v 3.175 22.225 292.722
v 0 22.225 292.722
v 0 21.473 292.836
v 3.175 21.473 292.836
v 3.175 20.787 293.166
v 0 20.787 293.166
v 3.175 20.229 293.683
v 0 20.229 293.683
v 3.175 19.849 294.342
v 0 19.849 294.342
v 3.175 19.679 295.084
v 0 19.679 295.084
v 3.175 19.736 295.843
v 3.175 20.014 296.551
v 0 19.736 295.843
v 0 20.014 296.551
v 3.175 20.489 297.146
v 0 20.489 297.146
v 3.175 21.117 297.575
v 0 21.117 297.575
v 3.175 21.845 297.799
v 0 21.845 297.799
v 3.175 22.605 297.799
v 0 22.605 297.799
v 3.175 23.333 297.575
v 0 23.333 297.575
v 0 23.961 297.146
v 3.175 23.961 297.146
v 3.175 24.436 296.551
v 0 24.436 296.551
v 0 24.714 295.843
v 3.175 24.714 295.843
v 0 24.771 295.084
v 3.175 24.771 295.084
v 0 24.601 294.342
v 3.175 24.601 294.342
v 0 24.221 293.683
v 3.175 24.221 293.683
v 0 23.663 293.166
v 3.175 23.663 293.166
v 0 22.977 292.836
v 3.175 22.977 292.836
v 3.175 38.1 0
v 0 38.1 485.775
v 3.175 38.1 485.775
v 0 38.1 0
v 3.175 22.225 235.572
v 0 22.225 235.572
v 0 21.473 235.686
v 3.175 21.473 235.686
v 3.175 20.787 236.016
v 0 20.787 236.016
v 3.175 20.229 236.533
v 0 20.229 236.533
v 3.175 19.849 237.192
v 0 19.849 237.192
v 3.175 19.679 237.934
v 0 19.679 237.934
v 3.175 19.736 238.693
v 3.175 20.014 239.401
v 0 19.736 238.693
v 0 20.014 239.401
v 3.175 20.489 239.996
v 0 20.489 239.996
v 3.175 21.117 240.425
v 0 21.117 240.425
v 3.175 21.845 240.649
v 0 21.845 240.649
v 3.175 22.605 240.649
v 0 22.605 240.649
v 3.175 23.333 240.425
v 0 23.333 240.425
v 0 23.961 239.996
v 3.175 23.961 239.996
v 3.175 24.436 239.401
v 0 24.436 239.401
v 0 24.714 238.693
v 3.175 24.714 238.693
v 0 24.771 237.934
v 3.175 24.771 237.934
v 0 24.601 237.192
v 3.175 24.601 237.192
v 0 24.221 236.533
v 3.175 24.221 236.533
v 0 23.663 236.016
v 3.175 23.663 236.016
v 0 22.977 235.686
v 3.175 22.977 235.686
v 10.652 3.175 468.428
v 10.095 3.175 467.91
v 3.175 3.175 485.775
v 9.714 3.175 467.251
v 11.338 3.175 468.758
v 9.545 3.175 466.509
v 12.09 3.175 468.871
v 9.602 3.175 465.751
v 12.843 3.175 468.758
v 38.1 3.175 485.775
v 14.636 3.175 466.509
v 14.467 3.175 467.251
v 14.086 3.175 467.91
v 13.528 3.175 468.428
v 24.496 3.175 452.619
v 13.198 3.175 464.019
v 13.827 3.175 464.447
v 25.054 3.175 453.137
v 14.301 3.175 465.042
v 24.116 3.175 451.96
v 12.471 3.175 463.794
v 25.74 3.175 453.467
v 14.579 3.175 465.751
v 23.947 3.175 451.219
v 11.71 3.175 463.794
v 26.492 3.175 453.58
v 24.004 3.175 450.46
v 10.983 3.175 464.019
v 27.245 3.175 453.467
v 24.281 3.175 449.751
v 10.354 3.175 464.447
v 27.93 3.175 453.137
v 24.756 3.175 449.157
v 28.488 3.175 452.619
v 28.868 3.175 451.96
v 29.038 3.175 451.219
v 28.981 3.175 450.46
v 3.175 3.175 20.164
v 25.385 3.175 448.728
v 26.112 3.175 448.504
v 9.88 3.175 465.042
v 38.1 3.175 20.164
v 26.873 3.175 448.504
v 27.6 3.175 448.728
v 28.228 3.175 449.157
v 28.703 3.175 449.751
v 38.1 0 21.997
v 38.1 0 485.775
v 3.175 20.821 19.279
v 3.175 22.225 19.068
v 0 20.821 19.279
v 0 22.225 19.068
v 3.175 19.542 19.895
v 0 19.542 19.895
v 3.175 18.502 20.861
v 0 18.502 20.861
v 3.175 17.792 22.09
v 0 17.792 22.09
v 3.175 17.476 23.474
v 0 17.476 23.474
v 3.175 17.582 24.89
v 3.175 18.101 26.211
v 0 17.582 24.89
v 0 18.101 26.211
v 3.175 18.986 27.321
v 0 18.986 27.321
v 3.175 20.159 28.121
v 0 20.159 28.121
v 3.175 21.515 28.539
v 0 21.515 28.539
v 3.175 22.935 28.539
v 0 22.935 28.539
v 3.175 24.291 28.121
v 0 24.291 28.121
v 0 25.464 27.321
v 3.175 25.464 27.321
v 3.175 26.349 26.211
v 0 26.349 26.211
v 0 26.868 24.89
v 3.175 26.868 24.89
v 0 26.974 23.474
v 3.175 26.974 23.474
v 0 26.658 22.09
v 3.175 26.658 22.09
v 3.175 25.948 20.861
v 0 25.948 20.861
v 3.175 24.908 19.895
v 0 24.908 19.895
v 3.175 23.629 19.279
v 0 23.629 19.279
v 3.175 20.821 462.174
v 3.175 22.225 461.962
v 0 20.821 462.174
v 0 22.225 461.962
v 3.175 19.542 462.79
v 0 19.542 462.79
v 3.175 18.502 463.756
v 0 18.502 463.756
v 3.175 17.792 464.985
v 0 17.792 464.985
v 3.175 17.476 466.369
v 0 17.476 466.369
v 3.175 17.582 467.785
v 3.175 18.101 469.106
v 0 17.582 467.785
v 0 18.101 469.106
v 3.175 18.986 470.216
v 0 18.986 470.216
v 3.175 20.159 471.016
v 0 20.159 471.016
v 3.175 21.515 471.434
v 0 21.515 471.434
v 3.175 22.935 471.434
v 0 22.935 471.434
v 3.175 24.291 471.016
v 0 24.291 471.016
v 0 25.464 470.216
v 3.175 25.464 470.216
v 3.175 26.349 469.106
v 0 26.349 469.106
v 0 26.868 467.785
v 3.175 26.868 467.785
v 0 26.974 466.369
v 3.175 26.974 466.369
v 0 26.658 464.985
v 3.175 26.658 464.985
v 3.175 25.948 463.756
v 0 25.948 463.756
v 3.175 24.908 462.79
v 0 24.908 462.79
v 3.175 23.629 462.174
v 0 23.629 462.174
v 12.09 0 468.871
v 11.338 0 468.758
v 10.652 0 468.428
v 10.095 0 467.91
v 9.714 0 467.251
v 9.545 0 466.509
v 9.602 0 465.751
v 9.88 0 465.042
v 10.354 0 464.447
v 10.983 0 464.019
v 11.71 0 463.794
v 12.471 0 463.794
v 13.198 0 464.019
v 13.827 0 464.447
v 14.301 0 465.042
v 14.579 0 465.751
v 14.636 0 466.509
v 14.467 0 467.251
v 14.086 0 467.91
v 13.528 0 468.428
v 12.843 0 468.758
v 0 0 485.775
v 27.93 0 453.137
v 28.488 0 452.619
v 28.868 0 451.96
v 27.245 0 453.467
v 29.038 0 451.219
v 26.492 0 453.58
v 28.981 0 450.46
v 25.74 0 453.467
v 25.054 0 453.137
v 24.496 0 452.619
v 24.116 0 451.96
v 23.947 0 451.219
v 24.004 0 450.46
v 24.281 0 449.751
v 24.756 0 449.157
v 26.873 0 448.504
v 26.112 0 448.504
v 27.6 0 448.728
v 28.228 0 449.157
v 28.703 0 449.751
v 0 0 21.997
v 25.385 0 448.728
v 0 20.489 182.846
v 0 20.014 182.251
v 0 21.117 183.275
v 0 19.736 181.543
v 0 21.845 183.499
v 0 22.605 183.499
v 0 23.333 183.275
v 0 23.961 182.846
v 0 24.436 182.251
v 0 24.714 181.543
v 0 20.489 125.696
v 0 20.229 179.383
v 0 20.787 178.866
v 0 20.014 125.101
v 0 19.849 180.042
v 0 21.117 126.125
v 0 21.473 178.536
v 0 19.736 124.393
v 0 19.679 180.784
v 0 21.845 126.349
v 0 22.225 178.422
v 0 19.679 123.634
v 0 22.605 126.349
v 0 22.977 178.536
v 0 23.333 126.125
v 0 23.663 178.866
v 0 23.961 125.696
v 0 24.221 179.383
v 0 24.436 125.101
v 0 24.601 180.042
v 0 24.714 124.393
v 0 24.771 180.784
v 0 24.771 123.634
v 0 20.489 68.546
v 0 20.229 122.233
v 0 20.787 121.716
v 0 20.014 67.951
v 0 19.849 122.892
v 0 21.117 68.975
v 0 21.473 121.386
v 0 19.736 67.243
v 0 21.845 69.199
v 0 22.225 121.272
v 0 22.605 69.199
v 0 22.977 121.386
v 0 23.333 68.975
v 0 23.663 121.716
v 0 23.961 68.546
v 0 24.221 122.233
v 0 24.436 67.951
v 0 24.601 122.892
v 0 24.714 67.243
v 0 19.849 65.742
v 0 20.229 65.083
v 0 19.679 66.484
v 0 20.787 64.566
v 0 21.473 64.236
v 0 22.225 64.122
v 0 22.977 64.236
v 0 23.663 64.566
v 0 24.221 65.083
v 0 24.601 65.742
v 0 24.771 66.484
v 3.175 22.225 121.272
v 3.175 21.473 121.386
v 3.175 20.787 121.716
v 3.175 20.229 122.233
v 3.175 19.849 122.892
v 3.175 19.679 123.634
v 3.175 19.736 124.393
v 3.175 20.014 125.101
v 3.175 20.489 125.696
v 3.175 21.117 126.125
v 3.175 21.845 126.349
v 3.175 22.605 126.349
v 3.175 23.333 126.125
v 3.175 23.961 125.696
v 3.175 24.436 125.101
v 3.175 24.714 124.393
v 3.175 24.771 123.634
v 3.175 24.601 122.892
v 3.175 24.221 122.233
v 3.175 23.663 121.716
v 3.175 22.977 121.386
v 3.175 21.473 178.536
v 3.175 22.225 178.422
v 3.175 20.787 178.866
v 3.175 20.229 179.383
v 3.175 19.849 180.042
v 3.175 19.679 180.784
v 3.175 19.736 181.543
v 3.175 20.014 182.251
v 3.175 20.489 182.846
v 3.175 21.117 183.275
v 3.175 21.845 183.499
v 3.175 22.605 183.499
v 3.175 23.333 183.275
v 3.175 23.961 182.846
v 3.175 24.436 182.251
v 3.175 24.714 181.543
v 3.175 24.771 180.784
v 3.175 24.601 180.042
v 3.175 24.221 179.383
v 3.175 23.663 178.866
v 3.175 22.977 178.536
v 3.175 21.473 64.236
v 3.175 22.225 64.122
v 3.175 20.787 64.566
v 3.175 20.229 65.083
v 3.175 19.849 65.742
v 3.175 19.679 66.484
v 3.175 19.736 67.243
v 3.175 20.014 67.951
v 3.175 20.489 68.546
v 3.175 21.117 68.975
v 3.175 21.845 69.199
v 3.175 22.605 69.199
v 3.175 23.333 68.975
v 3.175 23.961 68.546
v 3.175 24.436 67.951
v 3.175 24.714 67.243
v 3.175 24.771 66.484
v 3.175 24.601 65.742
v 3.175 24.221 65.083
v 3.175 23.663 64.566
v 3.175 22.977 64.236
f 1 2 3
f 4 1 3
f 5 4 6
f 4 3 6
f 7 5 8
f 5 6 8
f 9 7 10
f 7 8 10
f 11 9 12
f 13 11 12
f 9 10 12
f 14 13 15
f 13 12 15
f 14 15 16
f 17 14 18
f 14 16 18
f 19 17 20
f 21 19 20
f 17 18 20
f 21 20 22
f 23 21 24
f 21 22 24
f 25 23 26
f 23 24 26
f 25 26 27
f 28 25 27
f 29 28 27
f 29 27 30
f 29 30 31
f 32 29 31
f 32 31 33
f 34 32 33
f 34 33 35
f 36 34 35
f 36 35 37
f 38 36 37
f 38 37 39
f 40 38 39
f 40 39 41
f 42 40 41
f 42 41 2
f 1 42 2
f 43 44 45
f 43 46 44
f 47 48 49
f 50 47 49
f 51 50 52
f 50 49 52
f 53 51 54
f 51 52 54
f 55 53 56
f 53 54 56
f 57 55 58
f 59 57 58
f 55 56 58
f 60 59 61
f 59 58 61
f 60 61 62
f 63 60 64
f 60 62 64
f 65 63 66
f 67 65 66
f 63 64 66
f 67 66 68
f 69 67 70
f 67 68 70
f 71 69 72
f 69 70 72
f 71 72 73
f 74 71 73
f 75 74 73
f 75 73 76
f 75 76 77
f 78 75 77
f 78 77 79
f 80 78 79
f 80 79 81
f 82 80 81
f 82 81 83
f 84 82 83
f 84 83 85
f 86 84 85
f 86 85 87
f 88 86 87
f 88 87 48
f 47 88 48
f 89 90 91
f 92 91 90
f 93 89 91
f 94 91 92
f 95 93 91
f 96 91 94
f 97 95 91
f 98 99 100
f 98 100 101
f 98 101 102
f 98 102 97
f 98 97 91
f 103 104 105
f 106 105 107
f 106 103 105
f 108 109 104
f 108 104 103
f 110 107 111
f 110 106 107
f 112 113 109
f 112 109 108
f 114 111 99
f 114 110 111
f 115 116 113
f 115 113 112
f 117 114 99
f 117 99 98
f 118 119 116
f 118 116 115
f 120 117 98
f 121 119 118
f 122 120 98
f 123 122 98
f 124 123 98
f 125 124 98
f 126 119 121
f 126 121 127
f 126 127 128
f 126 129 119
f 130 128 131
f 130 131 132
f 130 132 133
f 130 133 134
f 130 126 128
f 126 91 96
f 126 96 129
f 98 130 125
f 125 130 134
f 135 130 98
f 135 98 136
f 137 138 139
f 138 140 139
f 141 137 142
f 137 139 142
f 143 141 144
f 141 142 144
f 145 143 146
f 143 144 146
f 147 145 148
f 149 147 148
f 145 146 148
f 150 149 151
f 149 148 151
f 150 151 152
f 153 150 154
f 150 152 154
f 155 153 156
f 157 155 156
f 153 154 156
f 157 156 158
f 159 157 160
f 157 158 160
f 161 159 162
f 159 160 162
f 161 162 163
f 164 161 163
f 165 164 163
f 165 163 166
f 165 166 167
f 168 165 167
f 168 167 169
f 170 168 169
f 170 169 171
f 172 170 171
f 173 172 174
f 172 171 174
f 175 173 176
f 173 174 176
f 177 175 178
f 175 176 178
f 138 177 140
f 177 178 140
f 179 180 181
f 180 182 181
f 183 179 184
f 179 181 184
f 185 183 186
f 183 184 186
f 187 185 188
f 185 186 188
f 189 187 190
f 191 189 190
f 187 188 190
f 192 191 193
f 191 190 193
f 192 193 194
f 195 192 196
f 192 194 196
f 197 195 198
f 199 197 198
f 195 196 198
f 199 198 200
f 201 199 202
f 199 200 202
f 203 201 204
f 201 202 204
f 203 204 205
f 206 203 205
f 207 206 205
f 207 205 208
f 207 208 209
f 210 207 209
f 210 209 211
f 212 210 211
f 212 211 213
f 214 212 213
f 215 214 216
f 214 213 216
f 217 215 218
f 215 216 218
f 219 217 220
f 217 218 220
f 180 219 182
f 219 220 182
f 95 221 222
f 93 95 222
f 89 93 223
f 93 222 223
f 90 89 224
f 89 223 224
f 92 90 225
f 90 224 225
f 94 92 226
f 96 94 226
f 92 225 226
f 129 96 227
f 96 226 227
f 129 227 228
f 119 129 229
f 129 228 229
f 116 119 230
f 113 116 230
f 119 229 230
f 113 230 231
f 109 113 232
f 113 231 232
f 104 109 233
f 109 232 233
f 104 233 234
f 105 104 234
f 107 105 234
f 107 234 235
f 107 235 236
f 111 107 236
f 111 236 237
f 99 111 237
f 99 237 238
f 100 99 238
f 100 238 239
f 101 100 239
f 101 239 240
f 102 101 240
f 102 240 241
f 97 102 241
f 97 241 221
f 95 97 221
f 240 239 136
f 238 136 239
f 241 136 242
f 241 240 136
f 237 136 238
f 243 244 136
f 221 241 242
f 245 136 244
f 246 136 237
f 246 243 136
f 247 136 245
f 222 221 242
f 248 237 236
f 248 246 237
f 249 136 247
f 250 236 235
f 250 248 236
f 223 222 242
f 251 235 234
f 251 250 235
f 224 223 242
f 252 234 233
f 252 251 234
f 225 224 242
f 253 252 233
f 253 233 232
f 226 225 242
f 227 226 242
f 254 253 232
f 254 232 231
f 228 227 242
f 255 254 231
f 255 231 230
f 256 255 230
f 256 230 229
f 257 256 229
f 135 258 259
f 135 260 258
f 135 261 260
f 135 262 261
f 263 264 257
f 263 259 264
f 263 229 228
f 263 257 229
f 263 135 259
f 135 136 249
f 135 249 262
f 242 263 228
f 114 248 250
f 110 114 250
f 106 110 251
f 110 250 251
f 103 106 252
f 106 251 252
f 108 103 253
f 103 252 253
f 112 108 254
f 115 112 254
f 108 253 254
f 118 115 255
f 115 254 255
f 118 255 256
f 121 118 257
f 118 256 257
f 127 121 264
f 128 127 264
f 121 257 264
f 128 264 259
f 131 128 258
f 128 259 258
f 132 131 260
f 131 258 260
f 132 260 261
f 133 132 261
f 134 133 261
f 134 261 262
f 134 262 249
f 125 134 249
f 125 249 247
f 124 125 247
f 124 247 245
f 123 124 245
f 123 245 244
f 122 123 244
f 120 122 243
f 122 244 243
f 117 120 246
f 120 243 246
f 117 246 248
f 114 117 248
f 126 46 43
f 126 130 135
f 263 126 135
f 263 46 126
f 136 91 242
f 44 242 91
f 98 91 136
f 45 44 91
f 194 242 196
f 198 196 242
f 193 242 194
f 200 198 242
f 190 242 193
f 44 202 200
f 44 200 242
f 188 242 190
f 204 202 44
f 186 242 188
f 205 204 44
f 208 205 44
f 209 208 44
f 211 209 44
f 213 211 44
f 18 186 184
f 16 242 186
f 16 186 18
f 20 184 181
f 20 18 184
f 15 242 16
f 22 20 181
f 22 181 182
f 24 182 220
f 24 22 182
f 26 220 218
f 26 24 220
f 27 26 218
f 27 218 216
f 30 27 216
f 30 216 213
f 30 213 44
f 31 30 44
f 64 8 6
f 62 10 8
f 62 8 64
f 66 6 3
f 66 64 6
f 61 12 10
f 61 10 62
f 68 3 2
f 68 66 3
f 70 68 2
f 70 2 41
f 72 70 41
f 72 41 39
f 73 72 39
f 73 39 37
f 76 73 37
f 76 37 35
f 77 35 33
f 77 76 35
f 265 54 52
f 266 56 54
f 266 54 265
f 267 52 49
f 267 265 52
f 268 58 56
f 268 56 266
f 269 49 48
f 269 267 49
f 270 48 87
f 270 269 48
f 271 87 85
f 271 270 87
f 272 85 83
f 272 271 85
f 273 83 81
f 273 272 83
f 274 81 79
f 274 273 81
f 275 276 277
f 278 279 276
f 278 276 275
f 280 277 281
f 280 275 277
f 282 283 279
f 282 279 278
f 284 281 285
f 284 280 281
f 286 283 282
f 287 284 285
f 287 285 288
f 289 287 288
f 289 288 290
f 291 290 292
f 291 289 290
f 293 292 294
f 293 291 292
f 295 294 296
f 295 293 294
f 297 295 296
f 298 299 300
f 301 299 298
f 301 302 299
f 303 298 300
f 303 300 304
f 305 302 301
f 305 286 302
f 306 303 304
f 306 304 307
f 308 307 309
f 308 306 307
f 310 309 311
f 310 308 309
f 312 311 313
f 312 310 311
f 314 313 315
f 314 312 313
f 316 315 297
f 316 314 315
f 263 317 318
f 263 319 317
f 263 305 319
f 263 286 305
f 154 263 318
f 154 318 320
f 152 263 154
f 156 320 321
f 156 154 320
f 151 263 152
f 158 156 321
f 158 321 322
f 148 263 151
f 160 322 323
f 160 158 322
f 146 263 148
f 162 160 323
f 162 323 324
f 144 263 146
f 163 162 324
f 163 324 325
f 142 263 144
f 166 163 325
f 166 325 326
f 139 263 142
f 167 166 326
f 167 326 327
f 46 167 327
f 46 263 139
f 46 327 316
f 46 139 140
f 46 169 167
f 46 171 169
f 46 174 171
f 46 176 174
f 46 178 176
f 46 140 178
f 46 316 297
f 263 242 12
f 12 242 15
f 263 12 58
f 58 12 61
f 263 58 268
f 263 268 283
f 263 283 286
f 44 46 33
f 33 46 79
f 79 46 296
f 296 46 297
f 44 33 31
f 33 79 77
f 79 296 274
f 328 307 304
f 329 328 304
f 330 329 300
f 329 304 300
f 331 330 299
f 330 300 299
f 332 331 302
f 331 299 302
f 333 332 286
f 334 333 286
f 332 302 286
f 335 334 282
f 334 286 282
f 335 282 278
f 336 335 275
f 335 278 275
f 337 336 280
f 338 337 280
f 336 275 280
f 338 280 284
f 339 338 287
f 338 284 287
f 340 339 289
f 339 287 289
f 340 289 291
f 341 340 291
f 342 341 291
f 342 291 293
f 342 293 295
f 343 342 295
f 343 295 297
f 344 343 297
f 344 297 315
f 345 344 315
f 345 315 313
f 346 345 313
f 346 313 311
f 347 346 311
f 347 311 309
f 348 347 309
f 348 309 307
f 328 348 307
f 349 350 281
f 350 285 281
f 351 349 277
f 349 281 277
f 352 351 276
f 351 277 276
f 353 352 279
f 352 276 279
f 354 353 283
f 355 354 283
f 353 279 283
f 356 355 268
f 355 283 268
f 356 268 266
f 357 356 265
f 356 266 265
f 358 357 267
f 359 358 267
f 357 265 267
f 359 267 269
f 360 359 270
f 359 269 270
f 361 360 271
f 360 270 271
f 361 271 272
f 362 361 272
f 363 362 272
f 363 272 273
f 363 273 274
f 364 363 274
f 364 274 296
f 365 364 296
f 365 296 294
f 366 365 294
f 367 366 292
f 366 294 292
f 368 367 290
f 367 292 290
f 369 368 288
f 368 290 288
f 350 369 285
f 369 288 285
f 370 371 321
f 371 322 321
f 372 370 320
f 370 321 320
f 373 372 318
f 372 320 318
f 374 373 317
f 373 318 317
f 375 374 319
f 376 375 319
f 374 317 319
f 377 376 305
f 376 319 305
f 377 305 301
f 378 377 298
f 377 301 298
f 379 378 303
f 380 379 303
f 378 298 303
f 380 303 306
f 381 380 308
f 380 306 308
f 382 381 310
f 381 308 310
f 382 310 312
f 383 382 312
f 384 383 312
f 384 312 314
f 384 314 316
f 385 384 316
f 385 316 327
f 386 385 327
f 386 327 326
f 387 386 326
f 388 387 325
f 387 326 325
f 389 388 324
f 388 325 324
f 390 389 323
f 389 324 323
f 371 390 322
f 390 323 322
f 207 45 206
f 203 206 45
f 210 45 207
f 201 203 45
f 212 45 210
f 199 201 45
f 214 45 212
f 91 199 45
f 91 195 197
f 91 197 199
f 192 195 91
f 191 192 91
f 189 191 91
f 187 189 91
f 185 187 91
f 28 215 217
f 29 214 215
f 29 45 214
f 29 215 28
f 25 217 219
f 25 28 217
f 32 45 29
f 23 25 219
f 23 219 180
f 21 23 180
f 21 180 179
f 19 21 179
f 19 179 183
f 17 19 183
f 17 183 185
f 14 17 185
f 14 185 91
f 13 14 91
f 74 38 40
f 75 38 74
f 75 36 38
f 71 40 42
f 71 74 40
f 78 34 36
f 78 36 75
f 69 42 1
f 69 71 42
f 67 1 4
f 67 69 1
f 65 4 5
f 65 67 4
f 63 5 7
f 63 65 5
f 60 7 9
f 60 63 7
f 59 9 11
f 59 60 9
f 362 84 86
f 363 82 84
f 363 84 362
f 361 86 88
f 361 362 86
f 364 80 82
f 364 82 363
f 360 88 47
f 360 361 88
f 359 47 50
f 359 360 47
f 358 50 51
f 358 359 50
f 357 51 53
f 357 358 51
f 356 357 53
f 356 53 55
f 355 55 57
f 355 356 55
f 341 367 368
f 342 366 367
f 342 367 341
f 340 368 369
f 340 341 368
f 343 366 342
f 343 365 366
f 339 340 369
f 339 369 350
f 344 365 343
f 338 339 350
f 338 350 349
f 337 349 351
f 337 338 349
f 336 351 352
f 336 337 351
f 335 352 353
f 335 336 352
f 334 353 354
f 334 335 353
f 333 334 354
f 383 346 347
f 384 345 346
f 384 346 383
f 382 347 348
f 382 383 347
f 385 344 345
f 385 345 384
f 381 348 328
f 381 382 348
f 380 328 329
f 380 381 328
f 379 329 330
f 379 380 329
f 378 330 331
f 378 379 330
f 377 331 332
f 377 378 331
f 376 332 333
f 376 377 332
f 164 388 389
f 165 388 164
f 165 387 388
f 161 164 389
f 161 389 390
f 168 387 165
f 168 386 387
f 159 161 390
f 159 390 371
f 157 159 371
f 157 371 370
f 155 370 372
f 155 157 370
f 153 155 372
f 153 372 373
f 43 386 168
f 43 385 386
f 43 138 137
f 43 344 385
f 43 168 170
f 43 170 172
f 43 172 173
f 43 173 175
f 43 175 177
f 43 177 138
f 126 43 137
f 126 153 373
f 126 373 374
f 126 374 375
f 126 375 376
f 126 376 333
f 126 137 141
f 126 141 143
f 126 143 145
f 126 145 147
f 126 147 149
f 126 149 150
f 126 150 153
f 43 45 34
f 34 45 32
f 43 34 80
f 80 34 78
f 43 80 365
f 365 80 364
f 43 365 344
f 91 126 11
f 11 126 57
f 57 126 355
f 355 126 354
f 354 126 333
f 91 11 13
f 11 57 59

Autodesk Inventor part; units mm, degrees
ref_plane "YZ Plane" through (0, 0, 0) normal (1, 0, 0) x (0, 1, 0)
ref_plane "XZ Plane" through (0, 0, 0) normal (0, 1, 0) x (-1, 0, 0)
ref_plane "XY Plane" through (0, 0, 0) normal (0, 0, 1) x (1, 0, 0)
sketch "Sketch1" plane through (0, 0, 0) normal (0, 0, 1) x (1, 0, 0)
  line L0 (0, 0) -> (0, 38.1)
  line L1 (0, 38.1) -> (3.175, 38.1)
  line L2 (3.175, 38.1) -> (3.175, 3.175)
  line L3 (3.175, 3.175) -> (38.1, 3.175)
  line L4 (38.1, 3.175) -> (38.1, 0)
  line L5 (38.1, 0) -> (0, 0)
  dimension "d0" = 38.1
  dimension "d1" = 3.175
extrude "Extrusion1" add sketch "Sketch1" along normal blind 485.775
sketch "Sketch4" plane through (3.175, 3.175, 0) normal (1, 0, 0) x (0, 0, -1)
  line L0 (0, 0) -> (-485.775, 0) projected
  line L1 (0, -3.175) -> (0, 34.925) projected
  line L2 (0, 34.925) -> (-26.0631, -10.2176)
  line L3 (-26.0631, -10.2176) -> (14.7874, -10.2176)
  line L4 (14.7874, -10.2176) -> (14.7874, 34.925)
  line L5 (14.7874, 34.925) -> (0, 34.925)
  line L6 (-20.164, 0) -> (29.2522, 0)
  dimension "d6" = 60
extrude "Extrusion2" cut sketch "Sketch4" along normal mid plane 476.25
sketch "Sketch5" plane through (3.175, 3.175, 485.775) normal (1, 0, 0) x (0, 0, -1)
  line L0 (0, 0) -> (0, 34.925) projected
  line L1 (465.611, 0) -> (0, 0) projected
  line L2 (465.611, 0) -> (485.775, 34.925) projected
  line L3 (485.775, 34.925) -> (0, 34.925) projected
  line L4 (471.1103, 34.925) -> (450.9463, 0)
  point P0 (485.775, -3.175)
  point P1 (19.05, 19.05)
  point P2 (461.9449, 19.05)
  dimension "d9" = 19.05
  dimension "d10" = 19.05
  dimension "d11" = 12.7
hole "Hole1" at (3.175, 22.225, 466.725) at (3.175, 22.225, 23.8301) direction (-1, 0, 0) diameter 9.525 end through all
sketch "Sketch6" plane through (3.175, 3.175, 485.775) normal (0, 1, 0) x (1, 0, 0)
  line L0 (0, 485.775) -> (0, 0) projected
  line L1 (34.925, 0) -> (0, 0) projected
  line L2 (34.925, 465.611) -> (34.925, 0) projected
  point P0 (-3.175, 485.775)
  point P1 (23.3172, 34.7472)
  point P2 (8.9154, 19.4564)
  dimension "d20" = 8.9154
  dimension "d21" = 19.4564
  dimension "d22" = 11.6078
  dimension "d23" = 34.7472
hole "Hole2" at (26.4922, 3.175, 451.0278) at (12.0904, 3.175, 466.3186) direction (0, -1, 0) diameter 5.1054 end through all
sketch "Sketch7" plane through (3.175, 3.175, 485.775) normal (1, 0, 0) x (0, 0, -1)
  circle A0 centre (19.05, 19.05) radius 4.7625 projected
  line L0 (0, 0) -> (0, 34.925) projected
  point P0 (485.775, -3.175)
  point P1 (190.5, 19.05)
  point P2 (247.65, 19.05)
  point P3 (304.8, 19.05)
  point P4 (361.95, 19.05)
  point P5 (419.1, 19.05)
  dimension "d31" = 190.5
  dimension "d32" = 57.15
  dimension "d35" = 57.15
  dimension "d45" = 57.15
  dimension "d46" = 57.15
hole "Hole3" at (3.175, 22.225, 295.275) at (3.175, 22.225, 238.125) at (3.175, 22.225, 180.975) at (3.175, 22.225, 123.825) at (3.175, 22.225, 66.675) direction (-1, 0, 0) diameter 5.1054 end through all clearance for "Flat Head Machine Screw (82)" size "#10" standard "Ansi Unified Screw Threads"
properties part number "CLB_084_ClimberMountTopAngle" material "Aluminum 6061"
